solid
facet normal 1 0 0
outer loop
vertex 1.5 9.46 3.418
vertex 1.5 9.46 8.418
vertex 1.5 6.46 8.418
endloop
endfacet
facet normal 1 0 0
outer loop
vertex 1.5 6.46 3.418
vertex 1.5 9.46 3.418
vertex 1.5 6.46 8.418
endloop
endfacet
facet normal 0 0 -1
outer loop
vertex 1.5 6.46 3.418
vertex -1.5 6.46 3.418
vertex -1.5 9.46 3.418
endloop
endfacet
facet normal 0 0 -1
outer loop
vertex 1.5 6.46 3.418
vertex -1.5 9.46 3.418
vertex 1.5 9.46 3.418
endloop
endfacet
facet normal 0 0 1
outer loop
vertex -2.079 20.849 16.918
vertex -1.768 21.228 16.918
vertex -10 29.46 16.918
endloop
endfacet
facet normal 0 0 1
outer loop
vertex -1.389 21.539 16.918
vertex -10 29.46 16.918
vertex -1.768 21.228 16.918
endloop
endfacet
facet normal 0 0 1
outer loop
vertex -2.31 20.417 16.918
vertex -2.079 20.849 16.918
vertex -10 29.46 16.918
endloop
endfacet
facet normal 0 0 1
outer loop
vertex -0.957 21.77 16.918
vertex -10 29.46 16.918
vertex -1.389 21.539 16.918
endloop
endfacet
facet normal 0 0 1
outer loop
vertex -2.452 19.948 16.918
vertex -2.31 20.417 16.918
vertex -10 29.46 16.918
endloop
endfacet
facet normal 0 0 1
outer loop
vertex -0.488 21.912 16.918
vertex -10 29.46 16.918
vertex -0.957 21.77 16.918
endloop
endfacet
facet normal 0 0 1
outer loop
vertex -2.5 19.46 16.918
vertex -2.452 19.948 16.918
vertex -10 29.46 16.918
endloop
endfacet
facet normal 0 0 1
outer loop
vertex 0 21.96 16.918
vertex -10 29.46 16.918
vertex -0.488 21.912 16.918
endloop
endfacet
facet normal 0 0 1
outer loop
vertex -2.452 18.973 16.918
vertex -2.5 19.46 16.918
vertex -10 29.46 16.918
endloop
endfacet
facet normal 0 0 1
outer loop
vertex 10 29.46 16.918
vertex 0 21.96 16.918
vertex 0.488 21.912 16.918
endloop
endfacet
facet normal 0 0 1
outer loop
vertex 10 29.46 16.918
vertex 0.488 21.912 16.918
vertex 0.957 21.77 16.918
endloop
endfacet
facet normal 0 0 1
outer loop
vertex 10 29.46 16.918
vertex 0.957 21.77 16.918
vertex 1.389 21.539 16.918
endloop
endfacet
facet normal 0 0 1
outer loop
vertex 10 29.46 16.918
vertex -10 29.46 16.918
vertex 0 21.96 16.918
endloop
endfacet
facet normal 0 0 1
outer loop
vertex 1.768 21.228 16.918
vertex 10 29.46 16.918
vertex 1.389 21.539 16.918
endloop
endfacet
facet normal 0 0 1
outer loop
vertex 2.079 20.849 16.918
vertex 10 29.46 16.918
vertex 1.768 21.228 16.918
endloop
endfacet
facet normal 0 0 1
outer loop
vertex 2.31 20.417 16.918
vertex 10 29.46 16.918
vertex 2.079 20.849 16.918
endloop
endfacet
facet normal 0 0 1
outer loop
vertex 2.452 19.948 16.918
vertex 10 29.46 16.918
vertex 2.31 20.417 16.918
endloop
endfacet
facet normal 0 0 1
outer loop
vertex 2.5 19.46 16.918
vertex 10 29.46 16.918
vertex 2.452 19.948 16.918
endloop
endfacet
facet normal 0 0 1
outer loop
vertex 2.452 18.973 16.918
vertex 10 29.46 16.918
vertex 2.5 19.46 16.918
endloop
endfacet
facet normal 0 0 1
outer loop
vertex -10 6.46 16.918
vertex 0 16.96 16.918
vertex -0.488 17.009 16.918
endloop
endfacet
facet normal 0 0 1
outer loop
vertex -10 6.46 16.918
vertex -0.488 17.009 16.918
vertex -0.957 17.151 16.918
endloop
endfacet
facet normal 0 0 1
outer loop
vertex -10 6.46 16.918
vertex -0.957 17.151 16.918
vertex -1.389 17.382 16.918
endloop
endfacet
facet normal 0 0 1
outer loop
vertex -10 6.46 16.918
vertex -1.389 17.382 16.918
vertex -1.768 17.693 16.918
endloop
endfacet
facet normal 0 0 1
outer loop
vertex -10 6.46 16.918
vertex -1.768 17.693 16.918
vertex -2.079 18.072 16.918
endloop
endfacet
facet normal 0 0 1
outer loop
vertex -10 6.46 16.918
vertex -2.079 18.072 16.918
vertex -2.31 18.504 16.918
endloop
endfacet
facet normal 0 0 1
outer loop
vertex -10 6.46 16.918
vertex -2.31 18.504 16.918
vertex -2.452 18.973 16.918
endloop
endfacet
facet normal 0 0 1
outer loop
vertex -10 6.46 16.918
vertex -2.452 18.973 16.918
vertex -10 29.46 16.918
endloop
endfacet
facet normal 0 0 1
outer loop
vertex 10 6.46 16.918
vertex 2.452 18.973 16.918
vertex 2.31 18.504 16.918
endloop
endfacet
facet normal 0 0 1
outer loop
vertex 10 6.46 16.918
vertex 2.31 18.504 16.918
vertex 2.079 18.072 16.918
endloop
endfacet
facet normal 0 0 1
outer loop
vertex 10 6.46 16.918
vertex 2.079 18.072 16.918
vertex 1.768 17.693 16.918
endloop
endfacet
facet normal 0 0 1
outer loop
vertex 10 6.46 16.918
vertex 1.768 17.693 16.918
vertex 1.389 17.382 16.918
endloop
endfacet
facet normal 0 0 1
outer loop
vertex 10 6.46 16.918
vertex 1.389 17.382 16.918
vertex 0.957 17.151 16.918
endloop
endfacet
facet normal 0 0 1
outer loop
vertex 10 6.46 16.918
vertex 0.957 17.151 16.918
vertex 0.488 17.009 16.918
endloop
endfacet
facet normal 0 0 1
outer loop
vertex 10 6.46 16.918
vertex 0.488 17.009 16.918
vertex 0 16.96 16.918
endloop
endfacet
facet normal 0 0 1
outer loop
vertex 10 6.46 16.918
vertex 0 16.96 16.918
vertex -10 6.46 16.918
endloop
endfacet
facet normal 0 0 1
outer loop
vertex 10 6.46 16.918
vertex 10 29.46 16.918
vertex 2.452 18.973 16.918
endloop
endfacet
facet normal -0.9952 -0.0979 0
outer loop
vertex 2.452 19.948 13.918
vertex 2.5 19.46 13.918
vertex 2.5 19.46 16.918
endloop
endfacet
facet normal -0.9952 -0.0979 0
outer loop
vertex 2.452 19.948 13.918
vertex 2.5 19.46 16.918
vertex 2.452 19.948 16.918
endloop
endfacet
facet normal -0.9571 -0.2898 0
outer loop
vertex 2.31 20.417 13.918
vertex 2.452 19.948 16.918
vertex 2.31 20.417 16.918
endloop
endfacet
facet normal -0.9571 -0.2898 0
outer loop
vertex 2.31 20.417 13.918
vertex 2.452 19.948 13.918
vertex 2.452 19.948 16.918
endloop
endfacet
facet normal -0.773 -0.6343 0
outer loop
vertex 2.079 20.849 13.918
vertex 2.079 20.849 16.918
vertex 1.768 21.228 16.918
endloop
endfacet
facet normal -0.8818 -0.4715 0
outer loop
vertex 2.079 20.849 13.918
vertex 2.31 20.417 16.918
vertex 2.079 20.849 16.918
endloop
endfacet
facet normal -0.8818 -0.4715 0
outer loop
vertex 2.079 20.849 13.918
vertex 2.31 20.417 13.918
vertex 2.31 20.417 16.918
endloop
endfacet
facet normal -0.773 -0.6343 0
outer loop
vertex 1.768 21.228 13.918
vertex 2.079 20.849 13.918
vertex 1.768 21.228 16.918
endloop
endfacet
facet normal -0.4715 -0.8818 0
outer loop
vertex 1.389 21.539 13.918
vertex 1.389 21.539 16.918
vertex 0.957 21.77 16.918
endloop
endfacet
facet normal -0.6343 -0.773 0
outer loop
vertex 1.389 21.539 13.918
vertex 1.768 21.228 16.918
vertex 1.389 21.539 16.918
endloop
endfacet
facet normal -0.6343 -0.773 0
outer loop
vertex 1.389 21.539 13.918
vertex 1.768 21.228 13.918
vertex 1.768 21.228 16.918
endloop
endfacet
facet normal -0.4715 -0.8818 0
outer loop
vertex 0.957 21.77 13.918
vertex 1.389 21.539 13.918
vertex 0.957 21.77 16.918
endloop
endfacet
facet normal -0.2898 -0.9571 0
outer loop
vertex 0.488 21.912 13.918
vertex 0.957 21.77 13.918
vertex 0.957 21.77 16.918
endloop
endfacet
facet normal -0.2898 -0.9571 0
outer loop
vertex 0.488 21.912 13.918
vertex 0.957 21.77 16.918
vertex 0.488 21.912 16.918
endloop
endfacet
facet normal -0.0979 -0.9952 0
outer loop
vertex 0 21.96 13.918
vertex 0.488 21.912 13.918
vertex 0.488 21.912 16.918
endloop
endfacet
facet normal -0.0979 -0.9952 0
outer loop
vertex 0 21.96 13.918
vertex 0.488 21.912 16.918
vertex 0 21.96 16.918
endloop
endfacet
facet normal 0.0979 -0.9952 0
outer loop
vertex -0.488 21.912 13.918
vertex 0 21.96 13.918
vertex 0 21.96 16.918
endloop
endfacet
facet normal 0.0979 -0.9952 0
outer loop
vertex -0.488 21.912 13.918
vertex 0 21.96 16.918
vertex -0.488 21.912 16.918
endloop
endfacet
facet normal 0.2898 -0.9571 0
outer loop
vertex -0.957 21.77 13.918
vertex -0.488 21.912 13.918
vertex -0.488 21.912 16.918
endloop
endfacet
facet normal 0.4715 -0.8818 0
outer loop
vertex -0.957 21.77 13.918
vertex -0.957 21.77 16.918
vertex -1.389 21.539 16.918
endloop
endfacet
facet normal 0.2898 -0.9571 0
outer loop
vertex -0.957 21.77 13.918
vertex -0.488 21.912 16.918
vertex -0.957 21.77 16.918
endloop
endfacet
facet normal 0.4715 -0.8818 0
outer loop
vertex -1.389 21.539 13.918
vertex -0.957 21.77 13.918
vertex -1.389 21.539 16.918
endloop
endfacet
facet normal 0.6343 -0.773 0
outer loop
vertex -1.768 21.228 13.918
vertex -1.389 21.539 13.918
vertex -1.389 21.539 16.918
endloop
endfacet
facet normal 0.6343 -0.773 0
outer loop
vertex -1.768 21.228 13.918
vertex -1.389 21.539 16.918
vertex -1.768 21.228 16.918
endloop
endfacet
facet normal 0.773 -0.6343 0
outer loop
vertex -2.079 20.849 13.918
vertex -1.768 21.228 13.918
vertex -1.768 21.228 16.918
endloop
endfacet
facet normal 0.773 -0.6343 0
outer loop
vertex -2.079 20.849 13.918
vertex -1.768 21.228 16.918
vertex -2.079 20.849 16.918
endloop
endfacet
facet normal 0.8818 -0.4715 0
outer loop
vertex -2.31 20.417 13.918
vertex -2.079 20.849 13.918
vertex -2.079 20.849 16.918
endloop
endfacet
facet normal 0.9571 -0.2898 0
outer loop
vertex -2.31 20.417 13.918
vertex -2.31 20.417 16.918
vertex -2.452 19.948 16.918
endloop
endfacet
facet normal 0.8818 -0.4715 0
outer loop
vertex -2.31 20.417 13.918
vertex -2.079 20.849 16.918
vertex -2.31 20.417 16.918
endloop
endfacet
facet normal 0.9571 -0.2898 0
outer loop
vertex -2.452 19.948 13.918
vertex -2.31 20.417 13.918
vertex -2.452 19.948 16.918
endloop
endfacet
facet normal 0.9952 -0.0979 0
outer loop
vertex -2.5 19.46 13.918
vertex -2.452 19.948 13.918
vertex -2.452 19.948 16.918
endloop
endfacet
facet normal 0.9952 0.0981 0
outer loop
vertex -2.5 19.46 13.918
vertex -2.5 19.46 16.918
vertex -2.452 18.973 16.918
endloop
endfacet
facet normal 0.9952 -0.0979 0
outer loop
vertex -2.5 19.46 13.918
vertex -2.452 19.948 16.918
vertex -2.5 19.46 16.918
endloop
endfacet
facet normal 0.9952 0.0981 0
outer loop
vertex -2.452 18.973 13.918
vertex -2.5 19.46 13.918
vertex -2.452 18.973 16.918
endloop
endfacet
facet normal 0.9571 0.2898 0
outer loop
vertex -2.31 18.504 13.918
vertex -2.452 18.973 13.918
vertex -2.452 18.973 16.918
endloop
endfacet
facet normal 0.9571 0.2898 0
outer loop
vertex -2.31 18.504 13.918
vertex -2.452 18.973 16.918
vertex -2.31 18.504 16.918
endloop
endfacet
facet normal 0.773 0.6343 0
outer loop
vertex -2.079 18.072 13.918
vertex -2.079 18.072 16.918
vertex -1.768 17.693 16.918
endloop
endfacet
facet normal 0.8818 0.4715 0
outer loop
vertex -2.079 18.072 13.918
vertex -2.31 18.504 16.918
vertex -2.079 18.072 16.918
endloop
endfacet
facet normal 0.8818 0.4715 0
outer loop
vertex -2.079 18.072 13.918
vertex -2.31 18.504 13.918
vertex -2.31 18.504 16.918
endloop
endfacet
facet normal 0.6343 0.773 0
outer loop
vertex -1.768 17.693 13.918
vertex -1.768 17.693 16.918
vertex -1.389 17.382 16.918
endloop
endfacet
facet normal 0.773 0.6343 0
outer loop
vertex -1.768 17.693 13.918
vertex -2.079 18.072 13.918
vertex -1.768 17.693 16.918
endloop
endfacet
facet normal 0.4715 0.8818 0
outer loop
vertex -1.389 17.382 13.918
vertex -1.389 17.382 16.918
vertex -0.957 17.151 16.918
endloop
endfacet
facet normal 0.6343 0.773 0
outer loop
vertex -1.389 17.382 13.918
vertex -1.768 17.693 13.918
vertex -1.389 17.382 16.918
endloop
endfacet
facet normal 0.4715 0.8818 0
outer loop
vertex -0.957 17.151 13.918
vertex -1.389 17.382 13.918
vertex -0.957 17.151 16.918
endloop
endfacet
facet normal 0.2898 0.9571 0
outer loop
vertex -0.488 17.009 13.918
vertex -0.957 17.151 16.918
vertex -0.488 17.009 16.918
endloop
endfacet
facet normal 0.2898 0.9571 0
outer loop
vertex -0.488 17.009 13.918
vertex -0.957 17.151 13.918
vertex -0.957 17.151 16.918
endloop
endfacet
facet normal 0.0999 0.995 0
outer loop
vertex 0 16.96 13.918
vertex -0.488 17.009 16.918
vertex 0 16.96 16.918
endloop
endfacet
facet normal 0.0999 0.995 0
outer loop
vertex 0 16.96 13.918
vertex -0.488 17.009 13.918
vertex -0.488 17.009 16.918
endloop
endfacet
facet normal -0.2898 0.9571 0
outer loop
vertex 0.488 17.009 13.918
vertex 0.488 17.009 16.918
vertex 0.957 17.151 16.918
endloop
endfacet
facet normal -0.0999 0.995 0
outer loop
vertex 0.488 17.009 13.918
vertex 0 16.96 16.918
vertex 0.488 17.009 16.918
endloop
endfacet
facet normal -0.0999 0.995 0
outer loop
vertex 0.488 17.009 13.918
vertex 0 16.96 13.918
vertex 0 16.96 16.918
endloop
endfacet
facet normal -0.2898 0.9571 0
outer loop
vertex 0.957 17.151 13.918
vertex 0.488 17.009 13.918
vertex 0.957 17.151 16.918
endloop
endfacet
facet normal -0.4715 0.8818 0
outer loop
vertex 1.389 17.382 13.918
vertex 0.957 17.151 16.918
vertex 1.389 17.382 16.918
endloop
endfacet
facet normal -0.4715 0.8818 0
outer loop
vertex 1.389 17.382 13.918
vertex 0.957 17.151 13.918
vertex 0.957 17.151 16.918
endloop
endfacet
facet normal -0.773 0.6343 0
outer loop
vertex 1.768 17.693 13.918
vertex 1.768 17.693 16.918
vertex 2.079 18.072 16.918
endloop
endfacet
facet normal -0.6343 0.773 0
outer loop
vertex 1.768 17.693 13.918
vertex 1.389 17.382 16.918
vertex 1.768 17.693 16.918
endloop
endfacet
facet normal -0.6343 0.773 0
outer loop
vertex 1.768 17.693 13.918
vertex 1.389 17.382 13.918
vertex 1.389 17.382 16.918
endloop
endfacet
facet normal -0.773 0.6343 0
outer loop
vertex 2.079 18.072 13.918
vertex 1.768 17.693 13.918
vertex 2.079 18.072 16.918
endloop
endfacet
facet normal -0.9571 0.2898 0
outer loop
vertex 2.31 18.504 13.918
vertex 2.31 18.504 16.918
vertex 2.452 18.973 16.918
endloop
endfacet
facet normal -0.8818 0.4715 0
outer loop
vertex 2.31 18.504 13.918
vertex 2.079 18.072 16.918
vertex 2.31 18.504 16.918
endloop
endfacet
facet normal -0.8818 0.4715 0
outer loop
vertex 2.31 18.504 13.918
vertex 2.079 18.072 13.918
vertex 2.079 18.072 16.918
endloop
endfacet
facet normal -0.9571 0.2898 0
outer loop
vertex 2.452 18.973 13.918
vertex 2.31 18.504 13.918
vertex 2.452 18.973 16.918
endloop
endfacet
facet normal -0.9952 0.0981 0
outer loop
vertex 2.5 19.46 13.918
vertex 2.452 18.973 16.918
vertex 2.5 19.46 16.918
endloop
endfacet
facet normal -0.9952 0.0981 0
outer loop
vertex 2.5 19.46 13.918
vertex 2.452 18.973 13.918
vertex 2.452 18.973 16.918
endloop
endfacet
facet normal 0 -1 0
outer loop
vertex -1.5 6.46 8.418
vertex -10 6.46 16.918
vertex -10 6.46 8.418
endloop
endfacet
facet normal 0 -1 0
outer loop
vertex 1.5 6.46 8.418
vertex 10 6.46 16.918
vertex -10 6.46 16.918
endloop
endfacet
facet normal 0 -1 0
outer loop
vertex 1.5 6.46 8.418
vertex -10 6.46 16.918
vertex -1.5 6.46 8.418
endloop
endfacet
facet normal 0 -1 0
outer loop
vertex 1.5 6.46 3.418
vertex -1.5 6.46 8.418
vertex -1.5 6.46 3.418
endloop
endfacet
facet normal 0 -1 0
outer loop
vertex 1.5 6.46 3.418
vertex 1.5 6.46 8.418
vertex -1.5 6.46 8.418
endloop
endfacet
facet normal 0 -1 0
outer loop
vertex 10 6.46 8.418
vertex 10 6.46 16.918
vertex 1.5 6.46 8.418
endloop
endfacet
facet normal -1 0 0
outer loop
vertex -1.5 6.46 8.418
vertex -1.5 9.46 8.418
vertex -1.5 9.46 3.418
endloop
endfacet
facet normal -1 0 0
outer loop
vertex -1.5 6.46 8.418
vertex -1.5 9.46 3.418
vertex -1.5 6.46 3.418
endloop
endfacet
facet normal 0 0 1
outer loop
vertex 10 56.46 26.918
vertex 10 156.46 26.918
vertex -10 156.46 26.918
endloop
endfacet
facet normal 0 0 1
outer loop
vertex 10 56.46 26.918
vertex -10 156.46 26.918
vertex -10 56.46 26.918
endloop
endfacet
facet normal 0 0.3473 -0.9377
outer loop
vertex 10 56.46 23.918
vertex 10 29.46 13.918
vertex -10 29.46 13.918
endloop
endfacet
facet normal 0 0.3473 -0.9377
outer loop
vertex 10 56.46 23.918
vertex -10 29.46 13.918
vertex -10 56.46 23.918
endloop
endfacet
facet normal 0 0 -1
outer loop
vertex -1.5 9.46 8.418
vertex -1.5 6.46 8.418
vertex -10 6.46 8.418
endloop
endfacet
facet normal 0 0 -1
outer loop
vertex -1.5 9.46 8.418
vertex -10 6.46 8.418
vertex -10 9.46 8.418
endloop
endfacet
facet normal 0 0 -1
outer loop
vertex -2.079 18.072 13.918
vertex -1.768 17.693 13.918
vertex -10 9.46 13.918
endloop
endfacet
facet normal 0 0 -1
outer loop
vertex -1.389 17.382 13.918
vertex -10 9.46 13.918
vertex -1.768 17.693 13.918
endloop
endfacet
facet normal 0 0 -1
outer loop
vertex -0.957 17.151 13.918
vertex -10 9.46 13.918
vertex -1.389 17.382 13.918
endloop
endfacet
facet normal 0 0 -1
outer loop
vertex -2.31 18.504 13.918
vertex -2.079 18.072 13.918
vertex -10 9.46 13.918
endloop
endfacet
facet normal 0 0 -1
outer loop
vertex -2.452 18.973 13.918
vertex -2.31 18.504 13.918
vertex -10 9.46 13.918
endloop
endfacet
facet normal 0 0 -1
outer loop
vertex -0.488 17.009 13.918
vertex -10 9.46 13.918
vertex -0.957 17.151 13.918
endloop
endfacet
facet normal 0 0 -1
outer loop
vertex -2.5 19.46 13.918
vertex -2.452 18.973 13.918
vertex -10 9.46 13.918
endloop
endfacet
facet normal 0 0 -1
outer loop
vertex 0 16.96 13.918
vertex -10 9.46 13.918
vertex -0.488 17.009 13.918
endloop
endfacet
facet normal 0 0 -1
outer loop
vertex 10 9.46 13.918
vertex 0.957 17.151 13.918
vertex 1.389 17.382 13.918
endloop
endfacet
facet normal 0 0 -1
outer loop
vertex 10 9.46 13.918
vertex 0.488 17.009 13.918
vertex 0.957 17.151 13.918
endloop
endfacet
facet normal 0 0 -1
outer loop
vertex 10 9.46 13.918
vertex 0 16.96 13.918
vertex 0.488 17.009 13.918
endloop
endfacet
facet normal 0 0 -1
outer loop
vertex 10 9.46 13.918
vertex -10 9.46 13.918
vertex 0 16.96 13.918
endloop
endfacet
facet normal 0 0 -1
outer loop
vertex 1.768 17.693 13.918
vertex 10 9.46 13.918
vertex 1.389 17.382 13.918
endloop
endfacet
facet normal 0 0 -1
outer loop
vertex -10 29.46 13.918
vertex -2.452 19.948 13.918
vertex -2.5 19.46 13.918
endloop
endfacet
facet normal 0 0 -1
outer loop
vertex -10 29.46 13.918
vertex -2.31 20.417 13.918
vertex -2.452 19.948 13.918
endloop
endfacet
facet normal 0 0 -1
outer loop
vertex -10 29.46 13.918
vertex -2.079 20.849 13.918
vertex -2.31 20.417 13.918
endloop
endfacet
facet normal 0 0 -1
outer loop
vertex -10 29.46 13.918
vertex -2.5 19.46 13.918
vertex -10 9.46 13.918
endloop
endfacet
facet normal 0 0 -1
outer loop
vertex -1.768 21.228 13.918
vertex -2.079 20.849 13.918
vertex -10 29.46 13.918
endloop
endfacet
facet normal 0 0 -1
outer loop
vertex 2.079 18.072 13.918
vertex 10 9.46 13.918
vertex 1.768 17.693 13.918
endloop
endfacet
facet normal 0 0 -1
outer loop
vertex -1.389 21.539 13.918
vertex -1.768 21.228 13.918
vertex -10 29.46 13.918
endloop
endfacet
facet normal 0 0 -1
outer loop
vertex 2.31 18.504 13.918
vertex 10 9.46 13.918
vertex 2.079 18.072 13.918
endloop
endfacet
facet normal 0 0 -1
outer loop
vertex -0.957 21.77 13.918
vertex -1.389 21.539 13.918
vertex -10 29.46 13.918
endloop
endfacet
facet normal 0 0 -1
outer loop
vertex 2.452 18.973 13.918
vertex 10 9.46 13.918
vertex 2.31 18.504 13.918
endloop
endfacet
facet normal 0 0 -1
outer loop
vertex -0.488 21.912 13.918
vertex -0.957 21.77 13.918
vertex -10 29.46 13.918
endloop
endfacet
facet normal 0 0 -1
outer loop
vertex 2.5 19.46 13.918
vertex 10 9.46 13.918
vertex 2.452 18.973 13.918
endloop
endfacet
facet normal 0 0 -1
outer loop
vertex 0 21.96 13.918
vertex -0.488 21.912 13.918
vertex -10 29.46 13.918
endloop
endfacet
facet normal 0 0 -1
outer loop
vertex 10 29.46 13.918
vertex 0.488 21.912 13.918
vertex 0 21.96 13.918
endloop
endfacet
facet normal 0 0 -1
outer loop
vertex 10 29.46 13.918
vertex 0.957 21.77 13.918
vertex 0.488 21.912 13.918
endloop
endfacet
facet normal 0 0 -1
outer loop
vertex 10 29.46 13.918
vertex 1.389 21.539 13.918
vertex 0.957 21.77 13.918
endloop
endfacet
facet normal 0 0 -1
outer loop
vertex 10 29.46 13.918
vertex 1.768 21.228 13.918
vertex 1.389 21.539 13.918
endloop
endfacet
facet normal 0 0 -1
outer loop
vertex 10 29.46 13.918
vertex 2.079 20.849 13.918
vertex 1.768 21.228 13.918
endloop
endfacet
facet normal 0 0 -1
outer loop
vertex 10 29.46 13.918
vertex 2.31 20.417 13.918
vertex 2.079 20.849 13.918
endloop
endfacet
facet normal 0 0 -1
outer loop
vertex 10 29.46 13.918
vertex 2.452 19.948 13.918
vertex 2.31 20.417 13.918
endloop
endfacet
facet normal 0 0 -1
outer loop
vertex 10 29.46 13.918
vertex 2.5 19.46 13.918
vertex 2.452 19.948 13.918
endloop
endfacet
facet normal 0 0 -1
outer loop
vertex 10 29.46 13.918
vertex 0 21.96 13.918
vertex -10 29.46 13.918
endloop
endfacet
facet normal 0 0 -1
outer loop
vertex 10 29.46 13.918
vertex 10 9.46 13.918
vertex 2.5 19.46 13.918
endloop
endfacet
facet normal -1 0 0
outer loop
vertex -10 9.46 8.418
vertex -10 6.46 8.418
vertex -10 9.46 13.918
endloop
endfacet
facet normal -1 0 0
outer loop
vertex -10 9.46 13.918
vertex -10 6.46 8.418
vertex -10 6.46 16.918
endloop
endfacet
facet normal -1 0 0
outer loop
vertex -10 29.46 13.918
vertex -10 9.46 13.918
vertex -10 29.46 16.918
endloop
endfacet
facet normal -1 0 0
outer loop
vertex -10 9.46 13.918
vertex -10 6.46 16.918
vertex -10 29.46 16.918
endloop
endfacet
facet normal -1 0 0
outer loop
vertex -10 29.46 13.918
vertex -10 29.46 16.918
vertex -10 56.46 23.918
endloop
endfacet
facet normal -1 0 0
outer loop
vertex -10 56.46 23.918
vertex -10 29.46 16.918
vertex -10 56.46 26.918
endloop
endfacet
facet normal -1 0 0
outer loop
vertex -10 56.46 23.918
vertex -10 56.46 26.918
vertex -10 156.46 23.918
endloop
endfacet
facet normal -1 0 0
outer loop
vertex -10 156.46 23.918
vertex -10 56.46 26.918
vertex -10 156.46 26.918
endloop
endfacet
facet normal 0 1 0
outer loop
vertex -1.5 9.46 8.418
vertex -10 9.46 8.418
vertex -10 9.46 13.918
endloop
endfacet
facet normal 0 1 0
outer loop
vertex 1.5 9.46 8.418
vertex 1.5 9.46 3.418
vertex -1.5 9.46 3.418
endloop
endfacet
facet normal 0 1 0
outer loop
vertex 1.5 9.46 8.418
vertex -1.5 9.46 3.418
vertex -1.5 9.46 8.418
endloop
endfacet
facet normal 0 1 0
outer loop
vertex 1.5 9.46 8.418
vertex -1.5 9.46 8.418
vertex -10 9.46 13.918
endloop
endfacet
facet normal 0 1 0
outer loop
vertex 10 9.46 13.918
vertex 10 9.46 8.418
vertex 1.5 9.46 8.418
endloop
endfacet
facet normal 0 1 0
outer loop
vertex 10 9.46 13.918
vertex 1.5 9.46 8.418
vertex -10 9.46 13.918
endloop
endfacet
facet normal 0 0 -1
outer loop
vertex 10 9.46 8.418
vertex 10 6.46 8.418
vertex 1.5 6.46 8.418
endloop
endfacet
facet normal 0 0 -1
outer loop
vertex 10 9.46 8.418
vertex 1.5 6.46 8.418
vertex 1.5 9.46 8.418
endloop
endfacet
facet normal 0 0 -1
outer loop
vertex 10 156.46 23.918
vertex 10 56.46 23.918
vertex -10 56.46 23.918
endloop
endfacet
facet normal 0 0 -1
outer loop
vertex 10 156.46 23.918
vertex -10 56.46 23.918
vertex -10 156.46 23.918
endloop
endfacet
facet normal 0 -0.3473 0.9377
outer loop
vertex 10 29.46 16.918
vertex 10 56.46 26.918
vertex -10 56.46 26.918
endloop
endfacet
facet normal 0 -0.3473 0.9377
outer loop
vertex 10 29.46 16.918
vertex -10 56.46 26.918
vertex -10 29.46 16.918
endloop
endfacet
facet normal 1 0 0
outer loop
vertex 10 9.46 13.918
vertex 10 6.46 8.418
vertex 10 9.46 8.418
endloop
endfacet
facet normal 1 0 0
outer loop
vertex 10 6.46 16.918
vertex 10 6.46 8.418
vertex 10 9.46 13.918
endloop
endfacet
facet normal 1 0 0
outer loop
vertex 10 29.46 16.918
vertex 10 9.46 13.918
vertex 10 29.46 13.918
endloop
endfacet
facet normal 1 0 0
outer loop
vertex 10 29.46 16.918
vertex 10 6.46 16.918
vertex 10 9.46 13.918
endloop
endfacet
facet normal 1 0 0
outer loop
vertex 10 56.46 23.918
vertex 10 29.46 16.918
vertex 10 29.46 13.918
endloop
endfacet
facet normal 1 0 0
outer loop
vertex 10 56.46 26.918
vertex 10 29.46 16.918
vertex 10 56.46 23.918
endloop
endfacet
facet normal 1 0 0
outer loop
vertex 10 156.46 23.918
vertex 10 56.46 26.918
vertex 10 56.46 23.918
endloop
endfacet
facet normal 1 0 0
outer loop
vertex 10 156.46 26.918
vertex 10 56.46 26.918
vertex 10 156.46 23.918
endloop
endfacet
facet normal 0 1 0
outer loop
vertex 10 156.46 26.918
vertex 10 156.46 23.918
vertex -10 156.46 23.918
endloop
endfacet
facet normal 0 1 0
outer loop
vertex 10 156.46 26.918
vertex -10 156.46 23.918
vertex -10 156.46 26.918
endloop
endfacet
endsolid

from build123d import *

# Parameters (mm, degrees)
F1_DEPTH = 10
F2_R     = 2.5
F3_DEPTH = 26.918743
F4_W     = 3
F4_H     = 3
F5_DEPTH = 5


with BuildPart() as f1:
    # F0 (on Right) → F1 (new body, symmetric)
    with BuildSketch(Plane.YZ):
        Polygon((9.460487, 8.417743), (9.460487, 13.917743), (29.460487, 13.917743), (56.460487, 23.917743), (156.460487, 23.917743), (156.460487, 26.917743), (56.460487, 26.917743), (29.460487, 16.917743), (6.460487, 16.917743), (6.460487, 8.417743), align=None)
    extrude(amount=F1_DEPTH, both=True)

    # F2 (on Top) → F3 (cut, through all)
    with BuildSketch(Plane.XY):
        with Locations((0, 19.460487)):
            Circle(F2_R)
    extrude(amount=F3_DEPTH, mode=Mode.SUBTRACT)

    # F4 (on face) → F5 (join)
    with BuildSketch(Plane(origin=(0, 0, 8.417743), x_dir=(1, 0, 0), z_dir=(0, 0, -1))):
        with Locations((0, -7.960487)):
            Rectangle(F4_W, F4_H)
    extrude(amount=F5_DEPTH)


solid = f1.part
